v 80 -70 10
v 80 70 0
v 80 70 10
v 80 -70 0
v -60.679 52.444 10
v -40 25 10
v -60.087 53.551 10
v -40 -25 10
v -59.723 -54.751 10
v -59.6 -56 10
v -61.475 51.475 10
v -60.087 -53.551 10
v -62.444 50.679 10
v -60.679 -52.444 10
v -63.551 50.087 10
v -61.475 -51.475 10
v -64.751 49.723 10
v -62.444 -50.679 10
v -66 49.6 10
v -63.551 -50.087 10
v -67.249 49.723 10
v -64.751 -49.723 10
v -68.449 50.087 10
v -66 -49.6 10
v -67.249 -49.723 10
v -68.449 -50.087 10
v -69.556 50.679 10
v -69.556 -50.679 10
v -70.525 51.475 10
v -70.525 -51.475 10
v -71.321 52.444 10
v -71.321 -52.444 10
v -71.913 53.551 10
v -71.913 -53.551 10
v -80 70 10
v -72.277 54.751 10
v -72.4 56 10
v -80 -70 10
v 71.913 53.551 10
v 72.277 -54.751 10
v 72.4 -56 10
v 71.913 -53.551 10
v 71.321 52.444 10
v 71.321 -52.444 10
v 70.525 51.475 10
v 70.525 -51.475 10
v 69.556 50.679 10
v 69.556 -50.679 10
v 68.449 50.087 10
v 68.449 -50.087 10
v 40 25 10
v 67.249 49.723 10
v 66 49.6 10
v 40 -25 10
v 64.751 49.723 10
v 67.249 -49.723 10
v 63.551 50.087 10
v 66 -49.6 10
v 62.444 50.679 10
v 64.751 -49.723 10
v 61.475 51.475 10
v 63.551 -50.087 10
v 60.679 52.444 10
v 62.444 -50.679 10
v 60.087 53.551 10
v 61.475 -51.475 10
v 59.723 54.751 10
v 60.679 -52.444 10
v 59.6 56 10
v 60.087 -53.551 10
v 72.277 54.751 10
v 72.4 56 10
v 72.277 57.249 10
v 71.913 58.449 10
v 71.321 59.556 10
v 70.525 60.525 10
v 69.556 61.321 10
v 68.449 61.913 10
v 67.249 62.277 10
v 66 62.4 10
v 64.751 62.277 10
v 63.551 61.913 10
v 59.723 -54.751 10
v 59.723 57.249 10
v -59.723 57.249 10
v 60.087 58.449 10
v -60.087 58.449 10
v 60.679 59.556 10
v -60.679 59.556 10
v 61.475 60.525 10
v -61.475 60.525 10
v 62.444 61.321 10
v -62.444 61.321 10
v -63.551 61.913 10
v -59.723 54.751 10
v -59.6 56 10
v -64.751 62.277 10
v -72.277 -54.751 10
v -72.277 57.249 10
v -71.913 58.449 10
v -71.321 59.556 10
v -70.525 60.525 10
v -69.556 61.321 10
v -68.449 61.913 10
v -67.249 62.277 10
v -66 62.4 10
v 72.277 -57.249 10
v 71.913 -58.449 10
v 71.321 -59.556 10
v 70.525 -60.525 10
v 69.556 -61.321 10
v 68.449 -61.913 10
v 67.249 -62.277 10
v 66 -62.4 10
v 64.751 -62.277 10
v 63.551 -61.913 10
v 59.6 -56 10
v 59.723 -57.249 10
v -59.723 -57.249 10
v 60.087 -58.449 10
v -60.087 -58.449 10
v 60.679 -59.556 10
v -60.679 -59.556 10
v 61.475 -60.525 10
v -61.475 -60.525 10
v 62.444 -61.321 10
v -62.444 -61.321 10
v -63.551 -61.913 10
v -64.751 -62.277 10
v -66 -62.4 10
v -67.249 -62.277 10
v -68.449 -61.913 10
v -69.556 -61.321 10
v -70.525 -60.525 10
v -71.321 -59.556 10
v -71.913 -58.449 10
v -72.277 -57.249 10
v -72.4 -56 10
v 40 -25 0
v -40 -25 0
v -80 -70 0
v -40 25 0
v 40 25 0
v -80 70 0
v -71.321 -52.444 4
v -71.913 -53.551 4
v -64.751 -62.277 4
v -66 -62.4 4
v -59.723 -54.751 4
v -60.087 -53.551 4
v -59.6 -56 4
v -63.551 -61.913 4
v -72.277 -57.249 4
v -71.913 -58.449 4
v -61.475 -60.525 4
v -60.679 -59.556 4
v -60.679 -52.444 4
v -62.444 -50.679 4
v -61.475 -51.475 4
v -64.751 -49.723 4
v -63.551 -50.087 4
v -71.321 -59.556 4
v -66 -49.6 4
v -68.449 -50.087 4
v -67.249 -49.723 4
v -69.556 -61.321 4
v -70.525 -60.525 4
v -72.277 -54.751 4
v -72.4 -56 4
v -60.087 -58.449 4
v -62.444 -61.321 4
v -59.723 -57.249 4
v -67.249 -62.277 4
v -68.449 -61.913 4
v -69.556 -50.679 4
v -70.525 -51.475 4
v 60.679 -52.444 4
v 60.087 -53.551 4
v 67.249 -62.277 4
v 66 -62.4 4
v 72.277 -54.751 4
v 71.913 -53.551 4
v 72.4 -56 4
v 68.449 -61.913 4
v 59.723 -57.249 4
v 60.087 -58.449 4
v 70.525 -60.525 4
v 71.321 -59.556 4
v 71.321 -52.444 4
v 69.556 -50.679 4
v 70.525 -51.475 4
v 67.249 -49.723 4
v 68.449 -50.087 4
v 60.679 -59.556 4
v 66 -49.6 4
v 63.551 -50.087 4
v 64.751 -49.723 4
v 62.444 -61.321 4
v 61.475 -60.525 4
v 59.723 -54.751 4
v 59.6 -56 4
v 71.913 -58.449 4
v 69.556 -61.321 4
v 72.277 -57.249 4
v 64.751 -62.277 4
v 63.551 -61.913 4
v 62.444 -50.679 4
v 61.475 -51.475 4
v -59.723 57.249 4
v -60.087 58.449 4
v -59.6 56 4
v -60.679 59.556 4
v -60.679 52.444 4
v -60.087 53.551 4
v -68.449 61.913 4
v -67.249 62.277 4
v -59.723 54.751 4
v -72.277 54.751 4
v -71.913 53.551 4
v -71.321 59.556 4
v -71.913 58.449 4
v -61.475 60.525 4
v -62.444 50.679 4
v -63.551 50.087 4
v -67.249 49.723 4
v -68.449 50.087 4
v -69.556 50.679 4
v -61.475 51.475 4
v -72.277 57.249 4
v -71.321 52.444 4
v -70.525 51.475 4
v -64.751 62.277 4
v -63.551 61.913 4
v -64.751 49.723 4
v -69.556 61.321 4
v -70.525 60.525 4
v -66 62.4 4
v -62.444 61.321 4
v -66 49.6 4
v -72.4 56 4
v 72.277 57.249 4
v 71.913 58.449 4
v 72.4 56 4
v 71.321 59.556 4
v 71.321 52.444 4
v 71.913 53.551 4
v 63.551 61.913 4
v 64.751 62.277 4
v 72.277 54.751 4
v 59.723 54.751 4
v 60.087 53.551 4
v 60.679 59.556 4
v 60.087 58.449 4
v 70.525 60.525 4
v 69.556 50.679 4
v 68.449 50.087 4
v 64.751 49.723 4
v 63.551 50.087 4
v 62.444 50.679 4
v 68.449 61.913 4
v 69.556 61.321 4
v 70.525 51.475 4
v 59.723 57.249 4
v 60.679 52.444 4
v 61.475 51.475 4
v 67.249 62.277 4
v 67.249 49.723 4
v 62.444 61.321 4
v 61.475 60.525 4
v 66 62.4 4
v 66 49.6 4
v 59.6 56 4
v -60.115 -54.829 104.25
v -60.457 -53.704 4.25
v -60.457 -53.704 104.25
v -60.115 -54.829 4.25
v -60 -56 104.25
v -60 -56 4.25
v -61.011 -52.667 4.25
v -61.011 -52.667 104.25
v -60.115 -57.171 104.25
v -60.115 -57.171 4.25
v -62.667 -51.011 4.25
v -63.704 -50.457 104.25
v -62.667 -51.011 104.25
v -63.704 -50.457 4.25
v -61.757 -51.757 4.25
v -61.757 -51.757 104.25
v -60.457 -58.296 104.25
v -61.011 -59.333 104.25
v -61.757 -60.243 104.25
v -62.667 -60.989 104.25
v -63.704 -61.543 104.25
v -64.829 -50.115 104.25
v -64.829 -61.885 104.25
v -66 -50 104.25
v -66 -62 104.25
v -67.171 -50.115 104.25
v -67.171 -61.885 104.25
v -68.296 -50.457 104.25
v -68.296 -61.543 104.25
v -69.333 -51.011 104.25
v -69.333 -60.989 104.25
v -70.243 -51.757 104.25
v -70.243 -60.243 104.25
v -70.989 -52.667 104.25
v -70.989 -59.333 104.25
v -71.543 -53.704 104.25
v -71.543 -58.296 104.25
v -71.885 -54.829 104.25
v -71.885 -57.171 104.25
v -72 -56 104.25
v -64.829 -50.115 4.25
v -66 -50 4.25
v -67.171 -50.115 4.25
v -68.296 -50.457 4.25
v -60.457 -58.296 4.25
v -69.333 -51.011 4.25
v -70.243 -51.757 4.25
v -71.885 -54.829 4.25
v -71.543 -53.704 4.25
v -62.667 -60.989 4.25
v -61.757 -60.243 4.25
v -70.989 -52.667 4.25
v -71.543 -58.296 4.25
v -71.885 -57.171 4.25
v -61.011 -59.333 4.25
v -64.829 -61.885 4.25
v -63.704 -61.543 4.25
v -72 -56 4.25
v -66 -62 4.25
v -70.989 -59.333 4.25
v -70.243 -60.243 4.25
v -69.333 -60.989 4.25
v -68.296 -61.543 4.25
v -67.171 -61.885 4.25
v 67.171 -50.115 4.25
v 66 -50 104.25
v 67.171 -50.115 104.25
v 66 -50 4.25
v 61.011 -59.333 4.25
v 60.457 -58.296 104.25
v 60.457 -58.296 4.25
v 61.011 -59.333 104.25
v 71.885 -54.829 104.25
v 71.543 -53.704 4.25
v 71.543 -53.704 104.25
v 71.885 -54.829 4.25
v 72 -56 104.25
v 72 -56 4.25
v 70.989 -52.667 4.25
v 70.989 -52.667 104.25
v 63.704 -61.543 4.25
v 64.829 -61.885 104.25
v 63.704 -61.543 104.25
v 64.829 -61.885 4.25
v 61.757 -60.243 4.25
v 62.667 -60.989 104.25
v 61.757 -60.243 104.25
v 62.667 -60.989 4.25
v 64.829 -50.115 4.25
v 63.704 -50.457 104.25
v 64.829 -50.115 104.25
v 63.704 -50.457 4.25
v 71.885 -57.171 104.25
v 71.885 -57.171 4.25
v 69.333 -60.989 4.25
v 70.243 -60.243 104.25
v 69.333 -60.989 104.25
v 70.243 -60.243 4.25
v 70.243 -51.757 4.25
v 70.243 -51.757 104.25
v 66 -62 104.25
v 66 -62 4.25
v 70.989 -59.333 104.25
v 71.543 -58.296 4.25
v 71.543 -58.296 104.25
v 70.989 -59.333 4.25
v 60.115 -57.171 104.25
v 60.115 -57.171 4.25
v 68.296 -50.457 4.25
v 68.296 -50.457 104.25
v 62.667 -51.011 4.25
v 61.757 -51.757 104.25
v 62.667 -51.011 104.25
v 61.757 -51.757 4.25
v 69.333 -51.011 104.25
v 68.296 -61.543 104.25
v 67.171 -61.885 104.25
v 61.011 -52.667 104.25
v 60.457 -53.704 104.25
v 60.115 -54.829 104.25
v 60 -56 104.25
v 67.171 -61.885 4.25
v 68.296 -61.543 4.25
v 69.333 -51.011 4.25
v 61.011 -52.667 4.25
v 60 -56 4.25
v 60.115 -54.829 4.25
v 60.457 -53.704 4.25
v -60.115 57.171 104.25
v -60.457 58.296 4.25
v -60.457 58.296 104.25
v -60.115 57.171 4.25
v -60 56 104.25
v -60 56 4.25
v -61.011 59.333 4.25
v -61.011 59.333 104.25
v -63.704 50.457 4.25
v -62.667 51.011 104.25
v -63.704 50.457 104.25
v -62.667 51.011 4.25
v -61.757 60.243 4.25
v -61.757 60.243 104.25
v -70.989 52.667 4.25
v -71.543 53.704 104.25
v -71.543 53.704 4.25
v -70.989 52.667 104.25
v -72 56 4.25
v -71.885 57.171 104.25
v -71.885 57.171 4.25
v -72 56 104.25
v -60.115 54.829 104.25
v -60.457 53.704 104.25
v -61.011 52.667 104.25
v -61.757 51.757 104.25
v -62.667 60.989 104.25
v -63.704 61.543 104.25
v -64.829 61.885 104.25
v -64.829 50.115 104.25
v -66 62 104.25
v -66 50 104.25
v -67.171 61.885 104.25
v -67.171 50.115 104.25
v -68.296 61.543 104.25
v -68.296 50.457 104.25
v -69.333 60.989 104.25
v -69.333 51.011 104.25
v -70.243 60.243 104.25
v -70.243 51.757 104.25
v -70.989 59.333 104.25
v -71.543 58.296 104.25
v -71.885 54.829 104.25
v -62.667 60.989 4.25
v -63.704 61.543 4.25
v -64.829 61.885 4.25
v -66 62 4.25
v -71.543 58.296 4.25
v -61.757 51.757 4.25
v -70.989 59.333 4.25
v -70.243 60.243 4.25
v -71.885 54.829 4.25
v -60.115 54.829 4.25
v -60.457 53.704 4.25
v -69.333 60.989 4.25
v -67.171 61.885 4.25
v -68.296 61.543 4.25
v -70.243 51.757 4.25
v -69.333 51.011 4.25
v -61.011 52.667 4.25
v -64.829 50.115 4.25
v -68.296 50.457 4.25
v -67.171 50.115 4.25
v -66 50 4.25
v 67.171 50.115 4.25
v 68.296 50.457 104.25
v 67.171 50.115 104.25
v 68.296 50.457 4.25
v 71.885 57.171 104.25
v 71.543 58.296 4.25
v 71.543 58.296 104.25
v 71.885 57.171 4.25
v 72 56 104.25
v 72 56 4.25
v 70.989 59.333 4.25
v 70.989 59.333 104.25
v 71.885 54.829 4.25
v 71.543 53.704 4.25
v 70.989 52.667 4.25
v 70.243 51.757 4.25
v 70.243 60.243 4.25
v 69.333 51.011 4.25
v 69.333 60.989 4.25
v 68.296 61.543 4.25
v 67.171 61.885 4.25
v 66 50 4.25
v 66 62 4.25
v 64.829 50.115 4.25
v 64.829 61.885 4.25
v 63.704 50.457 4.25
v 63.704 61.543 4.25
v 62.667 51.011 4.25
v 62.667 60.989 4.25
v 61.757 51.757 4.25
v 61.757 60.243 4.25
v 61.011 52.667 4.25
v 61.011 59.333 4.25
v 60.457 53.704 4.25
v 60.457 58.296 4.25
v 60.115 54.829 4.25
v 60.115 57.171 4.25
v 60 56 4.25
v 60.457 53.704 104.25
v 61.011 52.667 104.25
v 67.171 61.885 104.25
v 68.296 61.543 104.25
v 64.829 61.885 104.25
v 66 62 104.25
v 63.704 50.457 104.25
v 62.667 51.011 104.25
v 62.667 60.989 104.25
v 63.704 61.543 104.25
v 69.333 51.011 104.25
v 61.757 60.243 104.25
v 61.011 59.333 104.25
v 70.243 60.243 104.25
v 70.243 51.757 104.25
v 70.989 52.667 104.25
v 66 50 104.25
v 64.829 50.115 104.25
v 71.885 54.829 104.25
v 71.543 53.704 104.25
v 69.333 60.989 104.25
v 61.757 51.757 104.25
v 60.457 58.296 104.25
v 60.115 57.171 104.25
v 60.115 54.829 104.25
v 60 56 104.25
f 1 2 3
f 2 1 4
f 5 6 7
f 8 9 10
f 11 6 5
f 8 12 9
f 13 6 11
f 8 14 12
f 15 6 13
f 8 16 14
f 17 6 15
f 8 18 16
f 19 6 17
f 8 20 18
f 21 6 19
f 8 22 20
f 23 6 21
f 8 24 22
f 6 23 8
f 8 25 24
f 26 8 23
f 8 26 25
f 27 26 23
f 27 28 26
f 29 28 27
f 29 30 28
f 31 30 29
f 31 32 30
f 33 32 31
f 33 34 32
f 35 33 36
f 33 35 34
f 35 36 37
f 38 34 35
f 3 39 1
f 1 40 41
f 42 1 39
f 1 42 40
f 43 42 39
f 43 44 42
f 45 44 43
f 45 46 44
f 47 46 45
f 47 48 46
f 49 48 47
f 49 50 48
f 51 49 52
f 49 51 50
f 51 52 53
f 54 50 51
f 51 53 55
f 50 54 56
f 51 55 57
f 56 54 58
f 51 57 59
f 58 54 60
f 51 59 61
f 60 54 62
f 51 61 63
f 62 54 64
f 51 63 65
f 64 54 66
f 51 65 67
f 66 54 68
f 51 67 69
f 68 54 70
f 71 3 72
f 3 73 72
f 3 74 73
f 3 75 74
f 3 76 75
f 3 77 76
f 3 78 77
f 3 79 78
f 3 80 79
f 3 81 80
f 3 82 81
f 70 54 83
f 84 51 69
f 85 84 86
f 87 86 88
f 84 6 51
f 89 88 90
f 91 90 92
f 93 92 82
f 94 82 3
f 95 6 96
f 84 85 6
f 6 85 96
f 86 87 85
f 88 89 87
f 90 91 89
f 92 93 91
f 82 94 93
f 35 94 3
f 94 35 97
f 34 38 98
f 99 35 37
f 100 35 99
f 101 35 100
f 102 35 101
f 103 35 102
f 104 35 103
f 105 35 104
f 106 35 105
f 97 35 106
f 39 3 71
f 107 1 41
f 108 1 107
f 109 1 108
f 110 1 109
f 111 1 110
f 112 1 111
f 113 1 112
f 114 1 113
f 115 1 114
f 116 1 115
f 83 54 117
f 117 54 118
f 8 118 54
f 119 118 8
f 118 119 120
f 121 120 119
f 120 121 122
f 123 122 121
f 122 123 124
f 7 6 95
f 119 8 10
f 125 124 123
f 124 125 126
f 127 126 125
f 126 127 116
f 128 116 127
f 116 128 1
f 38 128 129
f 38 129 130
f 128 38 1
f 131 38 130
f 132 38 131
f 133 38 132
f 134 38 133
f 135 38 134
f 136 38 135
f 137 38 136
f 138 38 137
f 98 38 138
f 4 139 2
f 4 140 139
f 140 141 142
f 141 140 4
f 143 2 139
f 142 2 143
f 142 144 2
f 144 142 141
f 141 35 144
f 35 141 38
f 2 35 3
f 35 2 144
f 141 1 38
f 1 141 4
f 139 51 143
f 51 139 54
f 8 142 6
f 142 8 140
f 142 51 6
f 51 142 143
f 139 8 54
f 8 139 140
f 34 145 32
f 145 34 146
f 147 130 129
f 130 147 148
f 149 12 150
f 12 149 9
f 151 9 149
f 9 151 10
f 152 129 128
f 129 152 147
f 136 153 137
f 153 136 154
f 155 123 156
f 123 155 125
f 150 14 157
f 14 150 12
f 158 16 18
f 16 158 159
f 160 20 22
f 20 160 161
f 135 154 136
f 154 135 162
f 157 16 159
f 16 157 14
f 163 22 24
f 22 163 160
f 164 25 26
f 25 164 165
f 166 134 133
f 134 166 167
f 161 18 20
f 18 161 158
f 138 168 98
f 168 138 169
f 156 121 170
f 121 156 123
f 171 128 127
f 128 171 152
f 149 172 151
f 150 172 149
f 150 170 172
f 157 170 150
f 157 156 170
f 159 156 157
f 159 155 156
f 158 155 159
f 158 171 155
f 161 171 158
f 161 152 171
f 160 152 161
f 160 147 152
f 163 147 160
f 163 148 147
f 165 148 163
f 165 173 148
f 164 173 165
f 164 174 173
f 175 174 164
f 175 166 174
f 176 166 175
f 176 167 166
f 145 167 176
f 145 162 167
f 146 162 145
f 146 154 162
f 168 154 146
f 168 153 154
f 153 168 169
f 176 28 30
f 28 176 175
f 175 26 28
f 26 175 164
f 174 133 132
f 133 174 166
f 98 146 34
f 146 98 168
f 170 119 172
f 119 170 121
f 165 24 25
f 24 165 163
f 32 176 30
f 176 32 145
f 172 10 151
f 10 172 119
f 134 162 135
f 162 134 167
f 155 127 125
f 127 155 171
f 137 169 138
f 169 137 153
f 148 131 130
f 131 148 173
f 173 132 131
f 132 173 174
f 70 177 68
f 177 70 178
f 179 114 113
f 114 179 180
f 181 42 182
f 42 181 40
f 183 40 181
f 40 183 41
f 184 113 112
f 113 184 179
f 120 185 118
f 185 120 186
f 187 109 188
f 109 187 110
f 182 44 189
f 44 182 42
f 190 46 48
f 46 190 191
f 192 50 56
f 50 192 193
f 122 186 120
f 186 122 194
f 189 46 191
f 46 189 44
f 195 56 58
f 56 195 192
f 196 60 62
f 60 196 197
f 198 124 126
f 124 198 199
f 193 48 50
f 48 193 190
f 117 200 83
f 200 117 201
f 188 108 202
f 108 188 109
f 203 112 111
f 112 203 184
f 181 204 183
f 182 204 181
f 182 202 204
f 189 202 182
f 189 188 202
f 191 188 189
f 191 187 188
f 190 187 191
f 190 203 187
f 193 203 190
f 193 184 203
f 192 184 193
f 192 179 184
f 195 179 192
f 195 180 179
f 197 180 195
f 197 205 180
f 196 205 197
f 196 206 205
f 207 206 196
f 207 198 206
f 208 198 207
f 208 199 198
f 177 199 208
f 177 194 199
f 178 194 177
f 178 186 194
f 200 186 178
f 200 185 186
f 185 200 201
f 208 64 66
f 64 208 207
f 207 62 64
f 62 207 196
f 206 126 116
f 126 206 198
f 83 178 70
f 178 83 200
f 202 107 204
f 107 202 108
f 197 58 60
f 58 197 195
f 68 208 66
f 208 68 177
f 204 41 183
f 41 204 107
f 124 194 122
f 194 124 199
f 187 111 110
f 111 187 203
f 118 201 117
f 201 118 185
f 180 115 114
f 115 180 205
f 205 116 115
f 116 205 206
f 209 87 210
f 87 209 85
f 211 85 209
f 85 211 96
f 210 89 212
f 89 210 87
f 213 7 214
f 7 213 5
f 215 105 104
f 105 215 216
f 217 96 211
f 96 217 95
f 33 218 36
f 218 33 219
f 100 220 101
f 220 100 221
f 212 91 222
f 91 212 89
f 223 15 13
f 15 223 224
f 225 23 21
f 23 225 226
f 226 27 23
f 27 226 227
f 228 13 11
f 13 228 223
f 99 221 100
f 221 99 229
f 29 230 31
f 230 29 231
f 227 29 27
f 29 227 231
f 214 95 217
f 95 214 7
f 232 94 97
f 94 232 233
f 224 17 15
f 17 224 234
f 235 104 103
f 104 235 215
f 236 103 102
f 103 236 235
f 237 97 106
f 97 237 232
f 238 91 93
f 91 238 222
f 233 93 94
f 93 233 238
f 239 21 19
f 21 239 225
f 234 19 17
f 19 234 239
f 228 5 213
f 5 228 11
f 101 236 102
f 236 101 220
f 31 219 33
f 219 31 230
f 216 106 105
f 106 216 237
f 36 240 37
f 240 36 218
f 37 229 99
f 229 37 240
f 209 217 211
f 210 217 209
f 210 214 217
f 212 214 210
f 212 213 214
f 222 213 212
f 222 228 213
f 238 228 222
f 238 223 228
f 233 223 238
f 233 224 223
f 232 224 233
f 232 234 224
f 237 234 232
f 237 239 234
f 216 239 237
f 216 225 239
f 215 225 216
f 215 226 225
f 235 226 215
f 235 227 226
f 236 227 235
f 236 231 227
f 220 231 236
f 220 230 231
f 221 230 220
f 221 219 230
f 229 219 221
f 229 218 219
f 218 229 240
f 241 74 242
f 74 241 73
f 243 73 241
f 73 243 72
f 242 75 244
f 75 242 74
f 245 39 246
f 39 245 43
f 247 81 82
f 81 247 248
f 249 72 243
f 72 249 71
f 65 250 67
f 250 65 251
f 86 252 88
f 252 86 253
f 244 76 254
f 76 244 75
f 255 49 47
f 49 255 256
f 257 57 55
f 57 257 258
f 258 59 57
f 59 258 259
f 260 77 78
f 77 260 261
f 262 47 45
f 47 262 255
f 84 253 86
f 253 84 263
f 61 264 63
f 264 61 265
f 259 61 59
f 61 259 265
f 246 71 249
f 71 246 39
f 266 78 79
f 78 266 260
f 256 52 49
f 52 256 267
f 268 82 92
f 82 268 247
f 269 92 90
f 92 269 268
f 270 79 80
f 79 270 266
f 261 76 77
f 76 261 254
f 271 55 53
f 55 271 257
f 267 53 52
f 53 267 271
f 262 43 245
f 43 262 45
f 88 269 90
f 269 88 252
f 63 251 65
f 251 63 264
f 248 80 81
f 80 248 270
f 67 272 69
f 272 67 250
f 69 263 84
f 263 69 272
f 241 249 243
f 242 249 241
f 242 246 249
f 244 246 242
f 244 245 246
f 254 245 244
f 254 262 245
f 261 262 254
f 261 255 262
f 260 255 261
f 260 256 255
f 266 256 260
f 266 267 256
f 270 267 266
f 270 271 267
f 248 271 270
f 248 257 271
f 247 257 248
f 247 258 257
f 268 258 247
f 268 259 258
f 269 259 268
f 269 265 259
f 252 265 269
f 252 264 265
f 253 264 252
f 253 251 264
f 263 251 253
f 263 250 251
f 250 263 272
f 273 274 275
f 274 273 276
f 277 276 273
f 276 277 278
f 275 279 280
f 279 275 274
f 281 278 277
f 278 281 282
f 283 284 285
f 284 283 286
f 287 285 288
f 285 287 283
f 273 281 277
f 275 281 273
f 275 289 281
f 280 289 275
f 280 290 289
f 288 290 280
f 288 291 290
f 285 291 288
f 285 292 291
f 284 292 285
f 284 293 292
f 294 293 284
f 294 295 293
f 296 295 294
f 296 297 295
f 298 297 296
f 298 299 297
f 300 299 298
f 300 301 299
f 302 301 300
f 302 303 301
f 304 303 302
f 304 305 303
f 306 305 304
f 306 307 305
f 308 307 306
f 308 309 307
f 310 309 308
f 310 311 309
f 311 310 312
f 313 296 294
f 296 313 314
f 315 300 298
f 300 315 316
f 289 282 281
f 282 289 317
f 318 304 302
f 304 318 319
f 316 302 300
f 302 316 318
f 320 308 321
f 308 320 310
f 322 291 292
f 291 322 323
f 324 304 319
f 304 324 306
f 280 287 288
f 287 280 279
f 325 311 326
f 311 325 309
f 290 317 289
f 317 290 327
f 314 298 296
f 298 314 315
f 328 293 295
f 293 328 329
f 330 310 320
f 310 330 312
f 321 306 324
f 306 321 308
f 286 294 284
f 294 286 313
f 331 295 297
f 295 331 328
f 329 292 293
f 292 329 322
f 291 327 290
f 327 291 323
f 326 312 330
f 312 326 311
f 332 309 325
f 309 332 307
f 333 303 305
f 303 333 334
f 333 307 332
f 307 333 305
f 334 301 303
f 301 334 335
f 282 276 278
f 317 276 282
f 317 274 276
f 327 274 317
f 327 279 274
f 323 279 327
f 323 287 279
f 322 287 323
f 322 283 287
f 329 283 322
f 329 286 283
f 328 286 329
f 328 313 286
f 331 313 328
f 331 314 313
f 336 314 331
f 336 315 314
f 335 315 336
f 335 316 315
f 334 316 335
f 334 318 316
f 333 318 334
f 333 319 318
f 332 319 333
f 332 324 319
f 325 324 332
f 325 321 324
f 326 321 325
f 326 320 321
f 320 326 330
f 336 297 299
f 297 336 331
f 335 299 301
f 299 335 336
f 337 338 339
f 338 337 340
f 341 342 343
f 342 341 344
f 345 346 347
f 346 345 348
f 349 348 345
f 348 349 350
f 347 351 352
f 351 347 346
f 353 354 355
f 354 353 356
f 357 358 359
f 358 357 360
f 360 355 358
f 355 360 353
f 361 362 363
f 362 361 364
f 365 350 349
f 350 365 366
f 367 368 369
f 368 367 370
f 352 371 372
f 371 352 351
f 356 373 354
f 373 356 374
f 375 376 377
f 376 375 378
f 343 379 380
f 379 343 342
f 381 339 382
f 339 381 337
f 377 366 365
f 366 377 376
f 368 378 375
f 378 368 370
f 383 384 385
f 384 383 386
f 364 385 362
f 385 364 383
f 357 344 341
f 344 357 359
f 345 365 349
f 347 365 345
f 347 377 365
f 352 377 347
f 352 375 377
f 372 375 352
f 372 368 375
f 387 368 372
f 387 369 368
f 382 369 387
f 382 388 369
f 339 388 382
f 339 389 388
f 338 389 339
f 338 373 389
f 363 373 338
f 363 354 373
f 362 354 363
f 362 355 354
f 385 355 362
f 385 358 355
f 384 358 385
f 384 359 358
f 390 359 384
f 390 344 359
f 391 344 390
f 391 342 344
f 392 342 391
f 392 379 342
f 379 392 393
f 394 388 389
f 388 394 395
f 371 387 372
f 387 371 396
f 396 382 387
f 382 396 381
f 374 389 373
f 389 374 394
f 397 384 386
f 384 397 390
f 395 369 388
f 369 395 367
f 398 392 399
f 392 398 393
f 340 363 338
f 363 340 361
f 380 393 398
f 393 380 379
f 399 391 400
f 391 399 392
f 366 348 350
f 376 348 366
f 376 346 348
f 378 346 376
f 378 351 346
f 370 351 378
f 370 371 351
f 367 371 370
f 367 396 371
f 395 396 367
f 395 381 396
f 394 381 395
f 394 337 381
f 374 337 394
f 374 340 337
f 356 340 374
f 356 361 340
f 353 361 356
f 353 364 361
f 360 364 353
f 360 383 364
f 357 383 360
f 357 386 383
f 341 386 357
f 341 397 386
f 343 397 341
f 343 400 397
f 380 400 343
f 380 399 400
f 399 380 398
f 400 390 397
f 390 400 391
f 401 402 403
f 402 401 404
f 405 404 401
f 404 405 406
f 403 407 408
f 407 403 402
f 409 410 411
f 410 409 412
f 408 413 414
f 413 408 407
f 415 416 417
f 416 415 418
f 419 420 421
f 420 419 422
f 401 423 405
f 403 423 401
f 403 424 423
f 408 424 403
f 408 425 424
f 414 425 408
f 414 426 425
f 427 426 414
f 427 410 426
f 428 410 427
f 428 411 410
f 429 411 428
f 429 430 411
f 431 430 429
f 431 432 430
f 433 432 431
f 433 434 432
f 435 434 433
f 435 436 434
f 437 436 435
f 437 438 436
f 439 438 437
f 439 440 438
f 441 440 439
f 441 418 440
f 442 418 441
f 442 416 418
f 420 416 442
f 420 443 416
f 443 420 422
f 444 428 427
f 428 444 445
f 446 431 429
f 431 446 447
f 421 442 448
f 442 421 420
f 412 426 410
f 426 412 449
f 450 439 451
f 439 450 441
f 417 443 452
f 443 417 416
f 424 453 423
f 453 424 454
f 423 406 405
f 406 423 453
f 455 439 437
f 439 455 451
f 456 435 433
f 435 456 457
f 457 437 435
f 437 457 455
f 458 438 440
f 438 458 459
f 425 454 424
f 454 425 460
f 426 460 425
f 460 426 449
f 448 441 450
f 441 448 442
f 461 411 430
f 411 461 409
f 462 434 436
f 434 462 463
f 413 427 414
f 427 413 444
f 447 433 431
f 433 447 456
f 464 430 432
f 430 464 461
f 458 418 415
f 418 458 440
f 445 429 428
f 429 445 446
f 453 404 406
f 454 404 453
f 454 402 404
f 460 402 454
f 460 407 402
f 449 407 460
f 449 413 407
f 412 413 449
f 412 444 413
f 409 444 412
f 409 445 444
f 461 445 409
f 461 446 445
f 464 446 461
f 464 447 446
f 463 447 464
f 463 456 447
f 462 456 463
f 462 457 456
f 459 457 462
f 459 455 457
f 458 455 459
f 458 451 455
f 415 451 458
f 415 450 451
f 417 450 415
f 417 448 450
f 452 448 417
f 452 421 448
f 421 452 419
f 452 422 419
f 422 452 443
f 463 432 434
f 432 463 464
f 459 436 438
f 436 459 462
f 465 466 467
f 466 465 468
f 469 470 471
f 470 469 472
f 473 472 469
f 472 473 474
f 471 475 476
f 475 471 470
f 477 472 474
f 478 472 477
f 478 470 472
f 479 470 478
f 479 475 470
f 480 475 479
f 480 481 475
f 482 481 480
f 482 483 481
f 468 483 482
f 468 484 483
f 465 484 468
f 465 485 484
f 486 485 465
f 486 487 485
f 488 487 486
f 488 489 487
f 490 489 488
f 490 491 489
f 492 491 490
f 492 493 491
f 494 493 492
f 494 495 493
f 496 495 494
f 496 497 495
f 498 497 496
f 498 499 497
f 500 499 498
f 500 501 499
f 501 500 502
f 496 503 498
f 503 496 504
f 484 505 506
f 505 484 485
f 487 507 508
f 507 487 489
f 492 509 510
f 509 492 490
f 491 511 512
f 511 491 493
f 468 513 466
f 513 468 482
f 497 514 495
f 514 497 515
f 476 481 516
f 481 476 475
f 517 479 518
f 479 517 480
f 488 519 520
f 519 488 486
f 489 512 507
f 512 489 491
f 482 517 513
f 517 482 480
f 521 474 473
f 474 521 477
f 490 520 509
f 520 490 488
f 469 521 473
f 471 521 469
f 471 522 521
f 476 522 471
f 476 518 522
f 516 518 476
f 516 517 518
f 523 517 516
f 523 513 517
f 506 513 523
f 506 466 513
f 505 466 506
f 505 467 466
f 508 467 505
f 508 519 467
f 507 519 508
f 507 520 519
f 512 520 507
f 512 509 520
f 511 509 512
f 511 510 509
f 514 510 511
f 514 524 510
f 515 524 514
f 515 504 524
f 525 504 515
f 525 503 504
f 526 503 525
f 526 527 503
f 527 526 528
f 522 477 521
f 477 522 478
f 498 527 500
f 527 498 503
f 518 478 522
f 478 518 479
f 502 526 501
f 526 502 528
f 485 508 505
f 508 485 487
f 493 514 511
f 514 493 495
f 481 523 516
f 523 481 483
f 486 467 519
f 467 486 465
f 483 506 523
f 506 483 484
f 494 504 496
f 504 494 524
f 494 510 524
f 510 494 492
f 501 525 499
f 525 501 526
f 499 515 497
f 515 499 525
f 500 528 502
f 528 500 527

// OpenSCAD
$fn = 32;

// ------------------------------------------------------------------------
// Frame with four posts: 160 x 140 mm frame, four d12 posts
// Every part is its own module, assembly() places them once.
// ------------------------------------------------------------------------

// --- part 1 ---
module base_frame() {
  difference() {
    translate([-80, -70, 0]) cube([160, 140, 10]);
    translate([-40, -25, -1]) cube([80, 50, 12]);
    translate([-66, -56, 4]) cylinder(h = 7, d = 12.8);
    translate([66, -56, 4]) cylinder(h = 7, d = 12.8);
    translate([-66, 56, 4]) cylinder(h = 7, d = 12.8);
    translate([66, 56, 4]) cylinder(h = 7, d = 12.8);
  }
}

// --- part 2 ---
module post1() {
  cylinder(h = 100, d = 12);
}

// --- part 3 ---
module post2() {
  cylinder(h = 100, d = 12);
}

// --- part 4 ---
module post3() {
  cylinder(h = 100, d = 12);
}

// --- part 5 ---
module post4() {
  cylinder(h = 100, d = 12);
}

// --- assembly ---
module assembly() {
  translate([0, 0, 0]) rotate([0, 0, 0]) base_frame();
  translate([-66, -56, 4.25]) rotate([0, 0, 0]) post1();
  translate([66, -56, 4.25]) rotate([0, 0, 0]) post2();
  translate([-66, 56, 4.25]) rotate([0, 0, 0]) post3();
  translate([66, 56, 4.25]) rotate([0, 0, 0]) post4();
}

assembly();
